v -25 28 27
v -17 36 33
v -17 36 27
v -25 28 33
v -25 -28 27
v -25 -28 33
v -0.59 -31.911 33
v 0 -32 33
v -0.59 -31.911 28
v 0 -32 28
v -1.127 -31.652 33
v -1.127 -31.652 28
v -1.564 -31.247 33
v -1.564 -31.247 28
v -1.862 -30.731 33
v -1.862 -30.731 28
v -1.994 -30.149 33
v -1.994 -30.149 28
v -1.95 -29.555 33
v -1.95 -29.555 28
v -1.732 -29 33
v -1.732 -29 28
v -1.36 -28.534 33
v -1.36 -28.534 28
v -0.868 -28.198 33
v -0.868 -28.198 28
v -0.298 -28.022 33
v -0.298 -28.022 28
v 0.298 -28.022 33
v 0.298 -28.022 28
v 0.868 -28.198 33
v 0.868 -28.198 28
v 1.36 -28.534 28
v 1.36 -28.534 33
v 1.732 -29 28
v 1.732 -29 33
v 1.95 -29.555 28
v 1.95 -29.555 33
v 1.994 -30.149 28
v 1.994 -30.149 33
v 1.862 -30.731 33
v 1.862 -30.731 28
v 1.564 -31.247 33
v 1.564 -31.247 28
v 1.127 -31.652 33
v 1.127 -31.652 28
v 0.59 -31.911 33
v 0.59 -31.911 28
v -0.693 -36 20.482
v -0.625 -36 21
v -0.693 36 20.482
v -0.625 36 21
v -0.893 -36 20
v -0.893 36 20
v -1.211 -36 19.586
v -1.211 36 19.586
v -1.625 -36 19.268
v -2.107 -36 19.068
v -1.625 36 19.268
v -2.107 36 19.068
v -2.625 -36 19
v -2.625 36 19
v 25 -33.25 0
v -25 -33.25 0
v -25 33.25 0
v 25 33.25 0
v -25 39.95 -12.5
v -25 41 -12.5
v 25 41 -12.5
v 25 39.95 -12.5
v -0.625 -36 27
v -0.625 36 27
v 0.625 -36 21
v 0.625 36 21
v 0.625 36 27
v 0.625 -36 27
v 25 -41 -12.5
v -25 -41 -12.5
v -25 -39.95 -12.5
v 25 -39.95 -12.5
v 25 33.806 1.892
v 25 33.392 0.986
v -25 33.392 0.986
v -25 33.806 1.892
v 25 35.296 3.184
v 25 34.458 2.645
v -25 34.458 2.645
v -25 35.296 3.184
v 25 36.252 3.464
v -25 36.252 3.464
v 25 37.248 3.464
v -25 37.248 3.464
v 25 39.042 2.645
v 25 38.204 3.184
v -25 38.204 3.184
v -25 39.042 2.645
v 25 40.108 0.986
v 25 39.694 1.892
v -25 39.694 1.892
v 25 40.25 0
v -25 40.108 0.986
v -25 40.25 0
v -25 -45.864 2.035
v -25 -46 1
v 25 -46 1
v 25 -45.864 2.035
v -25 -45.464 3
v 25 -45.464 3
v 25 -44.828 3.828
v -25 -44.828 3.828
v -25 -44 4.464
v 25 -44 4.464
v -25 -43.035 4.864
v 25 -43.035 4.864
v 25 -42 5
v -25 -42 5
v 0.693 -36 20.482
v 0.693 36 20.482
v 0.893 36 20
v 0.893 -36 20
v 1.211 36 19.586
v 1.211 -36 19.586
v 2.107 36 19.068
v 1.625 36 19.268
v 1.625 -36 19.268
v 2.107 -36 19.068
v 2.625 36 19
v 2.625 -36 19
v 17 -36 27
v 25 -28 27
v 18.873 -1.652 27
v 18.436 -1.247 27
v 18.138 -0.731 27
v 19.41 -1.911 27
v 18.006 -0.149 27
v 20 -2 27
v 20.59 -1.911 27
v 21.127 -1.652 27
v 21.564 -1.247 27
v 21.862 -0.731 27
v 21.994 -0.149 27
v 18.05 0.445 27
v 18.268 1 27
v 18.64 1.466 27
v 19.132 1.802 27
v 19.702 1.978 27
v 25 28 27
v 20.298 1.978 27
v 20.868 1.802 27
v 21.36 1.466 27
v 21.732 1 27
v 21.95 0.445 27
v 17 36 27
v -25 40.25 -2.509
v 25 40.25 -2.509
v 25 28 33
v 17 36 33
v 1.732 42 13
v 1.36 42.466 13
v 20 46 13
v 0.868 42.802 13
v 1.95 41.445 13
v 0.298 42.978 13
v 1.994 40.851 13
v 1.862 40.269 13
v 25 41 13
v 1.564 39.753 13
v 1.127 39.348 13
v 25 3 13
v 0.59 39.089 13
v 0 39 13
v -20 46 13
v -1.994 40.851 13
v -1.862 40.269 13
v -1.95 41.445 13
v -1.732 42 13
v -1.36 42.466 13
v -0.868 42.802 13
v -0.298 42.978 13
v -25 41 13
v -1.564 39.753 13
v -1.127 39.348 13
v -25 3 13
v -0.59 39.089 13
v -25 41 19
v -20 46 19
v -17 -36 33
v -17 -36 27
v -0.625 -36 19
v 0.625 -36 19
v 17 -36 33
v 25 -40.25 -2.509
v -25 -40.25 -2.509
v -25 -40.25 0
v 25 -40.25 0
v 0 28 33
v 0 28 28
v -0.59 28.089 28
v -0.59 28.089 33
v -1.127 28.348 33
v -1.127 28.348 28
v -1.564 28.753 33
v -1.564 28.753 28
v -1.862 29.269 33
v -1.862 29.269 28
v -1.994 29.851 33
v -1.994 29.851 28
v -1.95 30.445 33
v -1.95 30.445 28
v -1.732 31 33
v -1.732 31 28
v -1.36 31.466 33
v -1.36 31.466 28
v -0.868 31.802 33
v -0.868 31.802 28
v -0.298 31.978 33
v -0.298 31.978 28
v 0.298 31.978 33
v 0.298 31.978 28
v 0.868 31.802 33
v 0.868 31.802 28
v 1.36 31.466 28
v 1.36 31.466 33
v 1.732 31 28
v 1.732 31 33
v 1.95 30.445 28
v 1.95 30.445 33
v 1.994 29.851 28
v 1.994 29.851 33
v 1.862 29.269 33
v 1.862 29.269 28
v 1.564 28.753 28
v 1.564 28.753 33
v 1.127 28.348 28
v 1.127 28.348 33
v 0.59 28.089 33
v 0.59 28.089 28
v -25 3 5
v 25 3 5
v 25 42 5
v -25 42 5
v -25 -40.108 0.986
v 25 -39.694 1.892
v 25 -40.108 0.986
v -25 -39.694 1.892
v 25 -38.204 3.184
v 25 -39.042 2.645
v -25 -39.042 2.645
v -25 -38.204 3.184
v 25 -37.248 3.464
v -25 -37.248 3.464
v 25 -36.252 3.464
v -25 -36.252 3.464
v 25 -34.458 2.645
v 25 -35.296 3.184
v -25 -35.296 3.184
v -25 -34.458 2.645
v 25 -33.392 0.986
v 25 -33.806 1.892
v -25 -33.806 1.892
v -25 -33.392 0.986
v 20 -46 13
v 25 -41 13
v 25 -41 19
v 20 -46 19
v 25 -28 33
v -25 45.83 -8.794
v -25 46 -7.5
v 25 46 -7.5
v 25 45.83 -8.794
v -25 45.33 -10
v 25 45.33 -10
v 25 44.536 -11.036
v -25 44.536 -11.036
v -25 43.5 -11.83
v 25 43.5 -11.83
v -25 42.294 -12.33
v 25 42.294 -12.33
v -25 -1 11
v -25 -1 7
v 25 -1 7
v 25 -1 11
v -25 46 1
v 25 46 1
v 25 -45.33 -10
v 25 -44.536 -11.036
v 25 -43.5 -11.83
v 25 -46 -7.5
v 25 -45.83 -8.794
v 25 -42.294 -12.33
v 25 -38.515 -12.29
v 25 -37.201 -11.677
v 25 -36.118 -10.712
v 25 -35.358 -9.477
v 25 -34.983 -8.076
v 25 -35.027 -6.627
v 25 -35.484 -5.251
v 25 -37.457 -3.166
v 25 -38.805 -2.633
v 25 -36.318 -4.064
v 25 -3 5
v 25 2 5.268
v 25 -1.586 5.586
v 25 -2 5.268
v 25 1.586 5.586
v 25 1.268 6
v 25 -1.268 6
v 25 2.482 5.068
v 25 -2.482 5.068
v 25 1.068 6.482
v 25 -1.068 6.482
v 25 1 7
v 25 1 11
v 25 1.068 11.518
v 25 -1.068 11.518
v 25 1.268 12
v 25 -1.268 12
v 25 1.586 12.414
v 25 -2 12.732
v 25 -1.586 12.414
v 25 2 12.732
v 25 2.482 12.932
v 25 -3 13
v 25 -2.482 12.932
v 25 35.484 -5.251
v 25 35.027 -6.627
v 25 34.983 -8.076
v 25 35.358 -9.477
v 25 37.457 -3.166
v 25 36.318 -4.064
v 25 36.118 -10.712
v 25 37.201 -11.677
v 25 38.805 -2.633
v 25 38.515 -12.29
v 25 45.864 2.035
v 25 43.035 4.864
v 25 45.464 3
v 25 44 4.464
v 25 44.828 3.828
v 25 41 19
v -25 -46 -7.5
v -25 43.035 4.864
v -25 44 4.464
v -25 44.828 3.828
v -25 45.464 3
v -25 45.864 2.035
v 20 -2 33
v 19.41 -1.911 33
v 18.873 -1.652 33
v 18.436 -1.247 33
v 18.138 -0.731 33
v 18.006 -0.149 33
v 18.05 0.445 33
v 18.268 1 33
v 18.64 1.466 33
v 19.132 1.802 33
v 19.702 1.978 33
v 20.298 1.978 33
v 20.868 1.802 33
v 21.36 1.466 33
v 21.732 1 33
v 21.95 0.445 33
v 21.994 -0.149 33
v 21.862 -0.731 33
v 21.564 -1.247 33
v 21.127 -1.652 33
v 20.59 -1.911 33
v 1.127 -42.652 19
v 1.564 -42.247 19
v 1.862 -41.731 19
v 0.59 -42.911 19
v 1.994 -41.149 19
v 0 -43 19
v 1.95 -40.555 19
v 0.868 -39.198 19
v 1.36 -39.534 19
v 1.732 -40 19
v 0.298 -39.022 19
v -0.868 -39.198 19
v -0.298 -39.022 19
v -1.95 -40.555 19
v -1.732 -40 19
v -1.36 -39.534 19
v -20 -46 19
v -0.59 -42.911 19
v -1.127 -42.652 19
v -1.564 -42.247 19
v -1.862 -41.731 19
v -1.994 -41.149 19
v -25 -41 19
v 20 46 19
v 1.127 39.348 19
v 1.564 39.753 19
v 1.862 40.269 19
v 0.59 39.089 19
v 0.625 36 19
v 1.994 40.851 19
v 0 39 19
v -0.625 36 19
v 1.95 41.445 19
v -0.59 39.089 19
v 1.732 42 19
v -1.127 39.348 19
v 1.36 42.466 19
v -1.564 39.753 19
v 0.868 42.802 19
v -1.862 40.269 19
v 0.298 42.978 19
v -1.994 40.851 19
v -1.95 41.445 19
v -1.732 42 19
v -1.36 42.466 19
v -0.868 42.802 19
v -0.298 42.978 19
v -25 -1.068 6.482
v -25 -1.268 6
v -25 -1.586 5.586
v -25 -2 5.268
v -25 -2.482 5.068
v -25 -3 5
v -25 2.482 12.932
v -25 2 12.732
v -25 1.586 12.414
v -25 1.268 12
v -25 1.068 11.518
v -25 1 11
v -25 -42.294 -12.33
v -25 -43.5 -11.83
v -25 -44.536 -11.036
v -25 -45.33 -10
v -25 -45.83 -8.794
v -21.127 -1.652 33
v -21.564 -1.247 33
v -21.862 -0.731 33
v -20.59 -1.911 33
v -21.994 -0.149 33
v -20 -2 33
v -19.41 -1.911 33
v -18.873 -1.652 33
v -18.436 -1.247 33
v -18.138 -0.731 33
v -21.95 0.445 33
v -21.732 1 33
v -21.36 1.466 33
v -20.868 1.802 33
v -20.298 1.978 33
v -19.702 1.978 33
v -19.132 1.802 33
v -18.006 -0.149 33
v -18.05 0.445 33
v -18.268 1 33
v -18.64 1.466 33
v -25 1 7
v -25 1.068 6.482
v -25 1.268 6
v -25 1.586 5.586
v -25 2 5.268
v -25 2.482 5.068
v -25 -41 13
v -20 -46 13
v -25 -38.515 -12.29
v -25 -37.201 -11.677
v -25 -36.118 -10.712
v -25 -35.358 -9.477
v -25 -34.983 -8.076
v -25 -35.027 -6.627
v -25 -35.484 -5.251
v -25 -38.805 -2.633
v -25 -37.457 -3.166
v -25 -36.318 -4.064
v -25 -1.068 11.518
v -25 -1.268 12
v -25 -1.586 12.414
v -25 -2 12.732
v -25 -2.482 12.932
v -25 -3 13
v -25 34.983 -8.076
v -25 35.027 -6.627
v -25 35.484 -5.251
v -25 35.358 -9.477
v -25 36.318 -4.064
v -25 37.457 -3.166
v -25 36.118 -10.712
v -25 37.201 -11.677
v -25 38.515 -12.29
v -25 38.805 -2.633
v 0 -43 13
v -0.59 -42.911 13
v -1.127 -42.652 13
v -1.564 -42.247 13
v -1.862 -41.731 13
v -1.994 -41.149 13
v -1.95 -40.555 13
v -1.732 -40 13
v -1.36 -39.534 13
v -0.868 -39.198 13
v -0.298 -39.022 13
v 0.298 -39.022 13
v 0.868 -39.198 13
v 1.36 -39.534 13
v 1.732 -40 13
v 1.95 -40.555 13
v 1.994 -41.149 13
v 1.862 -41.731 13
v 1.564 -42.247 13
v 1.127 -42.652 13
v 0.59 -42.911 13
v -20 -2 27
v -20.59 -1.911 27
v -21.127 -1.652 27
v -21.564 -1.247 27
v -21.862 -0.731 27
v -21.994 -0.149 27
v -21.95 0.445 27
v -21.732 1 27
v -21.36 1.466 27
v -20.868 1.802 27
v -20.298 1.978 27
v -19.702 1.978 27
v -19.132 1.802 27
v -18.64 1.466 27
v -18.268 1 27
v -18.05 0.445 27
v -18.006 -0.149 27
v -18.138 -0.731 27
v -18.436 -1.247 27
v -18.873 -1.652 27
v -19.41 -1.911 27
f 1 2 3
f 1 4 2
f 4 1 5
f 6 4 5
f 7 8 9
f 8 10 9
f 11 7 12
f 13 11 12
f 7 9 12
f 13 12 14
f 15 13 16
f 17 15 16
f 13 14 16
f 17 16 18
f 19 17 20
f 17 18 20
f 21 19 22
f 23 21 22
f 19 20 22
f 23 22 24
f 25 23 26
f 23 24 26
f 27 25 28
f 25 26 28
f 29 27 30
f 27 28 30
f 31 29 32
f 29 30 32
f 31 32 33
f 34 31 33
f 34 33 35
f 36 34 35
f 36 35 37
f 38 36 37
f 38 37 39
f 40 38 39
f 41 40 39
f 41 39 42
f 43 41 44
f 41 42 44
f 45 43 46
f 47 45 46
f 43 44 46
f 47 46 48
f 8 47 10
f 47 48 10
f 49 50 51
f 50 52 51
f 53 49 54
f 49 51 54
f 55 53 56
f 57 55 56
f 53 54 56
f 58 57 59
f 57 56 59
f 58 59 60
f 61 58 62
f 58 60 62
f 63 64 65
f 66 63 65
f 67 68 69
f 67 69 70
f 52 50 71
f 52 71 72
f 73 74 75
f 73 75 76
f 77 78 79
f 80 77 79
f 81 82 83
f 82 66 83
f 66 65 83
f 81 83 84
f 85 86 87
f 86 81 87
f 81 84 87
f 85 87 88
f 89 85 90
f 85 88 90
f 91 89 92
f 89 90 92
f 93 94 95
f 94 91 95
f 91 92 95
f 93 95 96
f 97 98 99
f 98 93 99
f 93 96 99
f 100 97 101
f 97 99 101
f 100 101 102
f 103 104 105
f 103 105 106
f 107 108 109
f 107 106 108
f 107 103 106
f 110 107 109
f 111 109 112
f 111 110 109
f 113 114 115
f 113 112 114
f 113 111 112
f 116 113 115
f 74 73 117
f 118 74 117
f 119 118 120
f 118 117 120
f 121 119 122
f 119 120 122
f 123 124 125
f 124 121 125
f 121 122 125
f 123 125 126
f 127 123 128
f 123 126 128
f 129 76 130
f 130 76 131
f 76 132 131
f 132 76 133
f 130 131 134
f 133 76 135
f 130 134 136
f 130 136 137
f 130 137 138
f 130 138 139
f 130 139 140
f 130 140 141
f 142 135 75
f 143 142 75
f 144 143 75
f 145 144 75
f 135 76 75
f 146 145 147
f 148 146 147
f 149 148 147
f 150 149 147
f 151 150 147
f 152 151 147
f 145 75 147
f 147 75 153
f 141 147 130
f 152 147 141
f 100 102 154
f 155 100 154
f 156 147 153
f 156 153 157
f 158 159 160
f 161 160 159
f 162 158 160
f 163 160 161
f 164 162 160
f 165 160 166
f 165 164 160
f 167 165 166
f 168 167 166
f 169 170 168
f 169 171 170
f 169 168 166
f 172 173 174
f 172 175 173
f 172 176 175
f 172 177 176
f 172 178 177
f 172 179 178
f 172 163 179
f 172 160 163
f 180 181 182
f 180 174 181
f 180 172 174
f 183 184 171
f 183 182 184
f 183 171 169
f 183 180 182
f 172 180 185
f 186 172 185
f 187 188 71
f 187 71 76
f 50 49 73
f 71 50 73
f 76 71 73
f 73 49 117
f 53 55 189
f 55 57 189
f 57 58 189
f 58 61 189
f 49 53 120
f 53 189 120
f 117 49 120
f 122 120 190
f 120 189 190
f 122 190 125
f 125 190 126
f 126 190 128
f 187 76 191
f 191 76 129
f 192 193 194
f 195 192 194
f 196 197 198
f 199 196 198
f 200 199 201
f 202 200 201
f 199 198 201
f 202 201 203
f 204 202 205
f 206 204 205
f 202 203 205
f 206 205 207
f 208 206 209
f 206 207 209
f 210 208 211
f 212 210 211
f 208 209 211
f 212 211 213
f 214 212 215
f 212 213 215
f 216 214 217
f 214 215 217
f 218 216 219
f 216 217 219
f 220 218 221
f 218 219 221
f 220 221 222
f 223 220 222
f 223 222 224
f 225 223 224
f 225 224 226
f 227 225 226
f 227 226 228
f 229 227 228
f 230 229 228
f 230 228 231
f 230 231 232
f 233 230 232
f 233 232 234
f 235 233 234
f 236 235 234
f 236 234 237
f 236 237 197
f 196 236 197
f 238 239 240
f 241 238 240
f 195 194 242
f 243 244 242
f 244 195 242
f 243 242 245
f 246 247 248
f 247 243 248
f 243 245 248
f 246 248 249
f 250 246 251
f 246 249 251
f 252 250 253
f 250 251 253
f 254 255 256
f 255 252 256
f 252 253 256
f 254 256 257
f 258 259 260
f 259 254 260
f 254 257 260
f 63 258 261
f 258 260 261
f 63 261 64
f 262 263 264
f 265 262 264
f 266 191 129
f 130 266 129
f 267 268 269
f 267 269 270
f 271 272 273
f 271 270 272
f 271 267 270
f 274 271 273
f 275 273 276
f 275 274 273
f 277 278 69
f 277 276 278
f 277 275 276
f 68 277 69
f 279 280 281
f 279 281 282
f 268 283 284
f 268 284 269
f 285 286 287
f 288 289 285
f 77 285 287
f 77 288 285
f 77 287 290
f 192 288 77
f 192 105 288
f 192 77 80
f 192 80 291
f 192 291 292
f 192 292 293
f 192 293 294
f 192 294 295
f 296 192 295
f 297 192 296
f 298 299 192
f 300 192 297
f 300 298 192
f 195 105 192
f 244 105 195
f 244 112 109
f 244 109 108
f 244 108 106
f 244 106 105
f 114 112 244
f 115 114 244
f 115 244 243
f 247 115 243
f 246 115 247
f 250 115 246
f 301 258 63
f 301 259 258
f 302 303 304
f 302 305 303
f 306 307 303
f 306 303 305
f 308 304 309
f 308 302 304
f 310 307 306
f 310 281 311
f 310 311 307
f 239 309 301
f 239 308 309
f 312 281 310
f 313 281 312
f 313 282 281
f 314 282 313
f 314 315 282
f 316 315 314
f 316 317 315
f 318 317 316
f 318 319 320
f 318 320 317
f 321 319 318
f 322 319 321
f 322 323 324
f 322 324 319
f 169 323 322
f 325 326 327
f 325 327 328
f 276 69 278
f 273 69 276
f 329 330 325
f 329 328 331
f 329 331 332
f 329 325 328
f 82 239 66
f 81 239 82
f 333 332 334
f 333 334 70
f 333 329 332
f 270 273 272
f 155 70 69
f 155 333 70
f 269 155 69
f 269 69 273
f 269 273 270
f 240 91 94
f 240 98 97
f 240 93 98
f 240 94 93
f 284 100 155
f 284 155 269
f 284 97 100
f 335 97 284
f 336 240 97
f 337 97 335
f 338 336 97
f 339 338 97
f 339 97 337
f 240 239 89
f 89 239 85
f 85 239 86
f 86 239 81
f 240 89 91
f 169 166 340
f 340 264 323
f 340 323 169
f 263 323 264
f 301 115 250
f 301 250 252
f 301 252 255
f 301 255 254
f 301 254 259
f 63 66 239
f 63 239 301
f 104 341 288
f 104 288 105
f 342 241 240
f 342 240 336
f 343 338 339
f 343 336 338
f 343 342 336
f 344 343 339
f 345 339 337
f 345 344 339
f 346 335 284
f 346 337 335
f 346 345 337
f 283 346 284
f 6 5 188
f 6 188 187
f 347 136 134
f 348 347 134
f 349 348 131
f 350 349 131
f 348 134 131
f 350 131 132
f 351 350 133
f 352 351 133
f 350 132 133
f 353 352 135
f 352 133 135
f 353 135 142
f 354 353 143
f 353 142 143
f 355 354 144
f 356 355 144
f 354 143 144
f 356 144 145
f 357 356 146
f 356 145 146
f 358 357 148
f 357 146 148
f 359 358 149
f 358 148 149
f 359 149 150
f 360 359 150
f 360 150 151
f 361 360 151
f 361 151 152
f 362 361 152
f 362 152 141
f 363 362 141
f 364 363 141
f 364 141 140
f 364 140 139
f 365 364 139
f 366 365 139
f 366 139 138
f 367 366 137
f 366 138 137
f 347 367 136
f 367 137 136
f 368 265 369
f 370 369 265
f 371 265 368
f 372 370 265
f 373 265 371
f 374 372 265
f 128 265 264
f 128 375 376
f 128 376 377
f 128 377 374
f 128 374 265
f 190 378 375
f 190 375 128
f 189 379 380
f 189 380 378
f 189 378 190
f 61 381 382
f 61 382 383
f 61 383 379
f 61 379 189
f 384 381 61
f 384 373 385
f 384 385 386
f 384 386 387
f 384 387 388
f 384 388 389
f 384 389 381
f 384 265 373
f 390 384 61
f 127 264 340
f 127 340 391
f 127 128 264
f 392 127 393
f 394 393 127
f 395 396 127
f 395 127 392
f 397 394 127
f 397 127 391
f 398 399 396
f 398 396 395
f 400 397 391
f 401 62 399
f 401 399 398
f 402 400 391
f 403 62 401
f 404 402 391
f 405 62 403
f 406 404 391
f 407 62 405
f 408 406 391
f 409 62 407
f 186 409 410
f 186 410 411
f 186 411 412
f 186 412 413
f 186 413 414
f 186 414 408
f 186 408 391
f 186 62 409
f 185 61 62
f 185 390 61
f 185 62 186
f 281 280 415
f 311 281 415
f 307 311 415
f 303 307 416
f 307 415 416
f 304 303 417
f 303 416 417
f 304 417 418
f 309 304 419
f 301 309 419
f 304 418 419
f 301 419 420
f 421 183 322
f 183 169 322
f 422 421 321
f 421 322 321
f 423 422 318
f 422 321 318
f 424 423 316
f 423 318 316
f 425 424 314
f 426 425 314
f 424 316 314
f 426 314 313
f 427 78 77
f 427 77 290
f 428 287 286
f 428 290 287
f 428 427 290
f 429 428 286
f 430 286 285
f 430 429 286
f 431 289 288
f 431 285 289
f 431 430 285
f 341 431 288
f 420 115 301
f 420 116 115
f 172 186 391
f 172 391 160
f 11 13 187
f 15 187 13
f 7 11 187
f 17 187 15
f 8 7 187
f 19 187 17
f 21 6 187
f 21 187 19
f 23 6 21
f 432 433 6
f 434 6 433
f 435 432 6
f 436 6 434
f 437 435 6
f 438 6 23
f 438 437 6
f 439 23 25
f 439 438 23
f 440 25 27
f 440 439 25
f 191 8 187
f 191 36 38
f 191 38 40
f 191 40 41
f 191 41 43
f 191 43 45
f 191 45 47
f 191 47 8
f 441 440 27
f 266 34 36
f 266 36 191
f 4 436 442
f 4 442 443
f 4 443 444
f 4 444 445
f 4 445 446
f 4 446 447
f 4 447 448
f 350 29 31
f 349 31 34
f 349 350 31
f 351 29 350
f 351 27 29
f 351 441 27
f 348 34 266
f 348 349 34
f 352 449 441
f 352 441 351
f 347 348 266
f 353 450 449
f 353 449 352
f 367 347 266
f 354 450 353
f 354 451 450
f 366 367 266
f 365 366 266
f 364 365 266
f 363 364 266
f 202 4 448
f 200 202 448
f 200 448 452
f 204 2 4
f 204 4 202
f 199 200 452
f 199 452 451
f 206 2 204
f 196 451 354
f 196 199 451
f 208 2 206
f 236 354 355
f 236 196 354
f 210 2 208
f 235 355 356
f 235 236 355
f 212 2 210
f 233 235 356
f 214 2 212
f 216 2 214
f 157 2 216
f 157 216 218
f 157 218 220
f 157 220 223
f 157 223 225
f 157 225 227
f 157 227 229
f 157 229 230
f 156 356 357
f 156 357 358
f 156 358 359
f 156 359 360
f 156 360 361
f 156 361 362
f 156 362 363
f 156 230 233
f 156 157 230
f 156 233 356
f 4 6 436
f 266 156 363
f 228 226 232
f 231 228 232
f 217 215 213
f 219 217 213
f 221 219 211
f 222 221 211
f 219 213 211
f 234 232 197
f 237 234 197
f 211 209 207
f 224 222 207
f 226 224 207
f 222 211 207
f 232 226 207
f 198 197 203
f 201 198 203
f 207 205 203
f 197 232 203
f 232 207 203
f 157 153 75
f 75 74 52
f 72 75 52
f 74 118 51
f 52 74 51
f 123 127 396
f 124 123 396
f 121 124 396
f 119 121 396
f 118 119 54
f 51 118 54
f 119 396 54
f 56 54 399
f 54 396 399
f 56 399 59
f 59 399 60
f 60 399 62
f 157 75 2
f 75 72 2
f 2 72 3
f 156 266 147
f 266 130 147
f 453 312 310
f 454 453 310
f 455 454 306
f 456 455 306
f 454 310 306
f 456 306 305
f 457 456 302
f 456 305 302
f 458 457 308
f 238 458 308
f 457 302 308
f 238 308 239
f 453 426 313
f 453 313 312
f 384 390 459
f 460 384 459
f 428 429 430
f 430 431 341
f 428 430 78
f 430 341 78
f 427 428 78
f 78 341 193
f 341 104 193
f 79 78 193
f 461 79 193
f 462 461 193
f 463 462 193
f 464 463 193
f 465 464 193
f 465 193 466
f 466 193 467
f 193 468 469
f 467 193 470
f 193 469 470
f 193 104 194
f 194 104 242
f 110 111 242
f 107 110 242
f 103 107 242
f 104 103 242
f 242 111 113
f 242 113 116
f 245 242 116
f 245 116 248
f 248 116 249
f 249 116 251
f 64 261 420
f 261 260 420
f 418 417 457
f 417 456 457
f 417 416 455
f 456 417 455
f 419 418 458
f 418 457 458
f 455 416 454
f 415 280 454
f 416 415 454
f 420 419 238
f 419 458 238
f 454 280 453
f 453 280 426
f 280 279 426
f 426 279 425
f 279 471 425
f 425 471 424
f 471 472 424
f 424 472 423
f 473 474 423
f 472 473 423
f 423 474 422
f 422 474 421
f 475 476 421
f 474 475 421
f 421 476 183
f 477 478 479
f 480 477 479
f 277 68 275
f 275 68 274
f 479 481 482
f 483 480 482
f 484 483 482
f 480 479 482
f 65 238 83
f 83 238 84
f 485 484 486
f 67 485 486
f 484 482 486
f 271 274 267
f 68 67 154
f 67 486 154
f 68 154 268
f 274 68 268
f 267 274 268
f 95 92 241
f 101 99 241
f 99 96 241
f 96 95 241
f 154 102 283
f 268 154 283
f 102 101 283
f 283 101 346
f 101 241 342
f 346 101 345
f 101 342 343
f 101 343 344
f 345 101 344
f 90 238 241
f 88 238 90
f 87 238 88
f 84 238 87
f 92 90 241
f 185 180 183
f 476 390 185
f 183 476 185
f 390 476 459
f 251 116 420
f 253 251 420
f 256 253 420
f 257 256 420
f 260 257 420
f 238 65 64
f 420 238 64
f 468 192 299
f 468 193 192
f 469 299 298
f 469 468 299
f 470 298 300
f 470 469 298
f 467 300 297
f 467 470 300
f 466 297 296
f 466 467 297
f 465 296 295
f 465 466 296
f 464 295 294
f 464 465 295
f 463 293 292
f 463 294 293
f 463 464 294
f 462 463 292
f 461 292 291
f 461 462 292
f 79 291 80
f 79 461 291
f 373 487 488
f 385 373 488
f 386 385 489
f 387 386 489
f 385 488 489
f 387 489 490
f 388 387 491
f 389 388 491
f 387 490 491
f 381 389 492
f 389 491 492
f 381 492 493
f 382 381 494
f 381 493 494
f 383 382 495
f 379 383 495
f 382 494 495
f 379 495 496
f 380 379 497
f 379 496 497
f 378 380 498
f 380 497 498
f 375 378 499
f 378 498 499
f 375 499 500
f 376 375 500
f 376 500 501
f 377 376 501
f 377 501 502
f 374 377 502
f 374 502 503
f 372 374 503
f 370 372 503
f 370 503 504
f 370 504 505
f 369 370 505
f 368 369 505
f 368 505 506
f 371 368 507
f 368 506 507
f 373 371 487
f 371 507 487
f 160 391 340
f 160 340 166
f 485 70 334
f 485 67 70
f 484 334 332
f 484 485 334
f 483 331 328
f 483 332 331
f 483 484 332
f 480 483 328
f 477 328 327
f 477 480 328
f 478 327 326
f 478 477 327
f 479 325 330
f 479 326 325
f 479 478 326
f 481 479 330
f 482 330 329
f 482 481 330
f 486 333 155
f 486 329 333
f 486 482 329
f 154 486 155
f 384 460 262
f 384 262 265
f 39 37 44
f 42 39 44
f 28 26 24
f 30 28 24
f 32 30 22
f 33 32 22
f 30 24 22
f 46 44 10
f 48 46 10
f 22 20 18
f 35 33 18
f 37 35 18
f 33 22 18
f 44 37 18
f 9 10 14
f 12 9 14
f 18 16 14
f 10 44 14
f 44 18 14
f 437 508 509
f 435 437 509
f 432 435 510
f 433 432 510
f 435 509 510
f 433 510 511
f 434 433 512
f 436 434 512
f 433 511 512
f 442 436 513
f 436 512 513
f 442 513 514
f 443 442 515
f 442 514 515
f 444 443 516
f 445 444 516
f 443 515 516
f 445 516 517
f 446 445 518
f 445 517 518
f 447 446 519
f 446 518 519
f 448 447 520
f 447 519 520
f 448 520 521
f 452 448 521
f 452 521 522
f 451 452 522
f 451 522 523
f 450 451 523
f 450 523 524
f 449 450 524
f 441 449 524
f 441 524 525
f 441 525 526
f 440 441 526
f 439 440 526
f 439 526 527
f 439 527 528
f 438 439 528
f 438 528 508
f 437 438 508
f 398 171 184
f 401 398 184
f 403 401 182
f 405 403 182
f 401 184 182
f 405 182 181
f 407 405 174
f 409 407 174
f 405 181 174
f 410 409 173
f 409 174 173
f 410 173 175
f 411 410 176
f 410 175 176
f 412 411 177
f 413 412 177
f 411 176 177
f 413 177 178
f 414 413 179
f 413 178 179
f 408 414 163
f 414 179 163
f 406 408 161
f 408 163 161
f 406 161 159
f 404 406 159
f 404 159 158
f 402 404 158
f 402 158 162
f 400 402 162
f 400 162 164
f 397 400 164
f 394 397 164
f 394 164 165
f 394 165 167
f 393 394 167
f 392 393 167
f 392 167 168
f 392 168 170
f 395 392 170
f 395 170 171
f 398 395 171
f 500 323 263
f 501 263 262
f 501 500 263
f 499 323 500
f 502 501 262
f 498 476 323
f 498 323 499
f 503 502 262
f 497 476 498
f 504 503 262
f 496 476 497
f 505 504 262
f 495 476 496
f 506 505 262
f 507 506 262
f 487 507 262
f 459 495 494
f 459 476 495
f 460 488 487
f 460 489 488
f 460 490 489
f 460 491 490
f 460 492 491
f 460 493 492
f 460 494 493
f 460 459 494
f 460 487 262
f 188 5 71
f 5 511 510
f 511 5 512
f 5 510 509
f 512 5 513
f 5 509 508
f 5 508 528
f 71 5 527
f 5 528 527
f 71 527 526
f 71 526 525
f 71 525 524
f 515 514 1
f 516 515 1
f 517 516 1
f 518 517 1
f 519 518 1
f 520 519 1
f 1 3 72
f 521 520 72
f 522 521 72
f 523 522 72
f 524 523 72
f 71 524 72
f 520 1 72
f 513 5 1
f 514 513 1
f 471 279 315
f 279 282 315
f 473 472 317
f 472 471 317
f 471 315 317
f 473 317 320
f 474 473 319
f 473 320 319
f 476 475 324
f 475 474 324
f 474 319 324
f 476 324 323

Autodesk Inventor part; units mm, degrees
ref_plane "YZ Plane" through (0, 0, 0) normal (1, 0, 0) x (0, 1, 0)
ref_plane "XZ Plane" through (0, 0, 0) normal (0, 1, 0) x (-1, 0, 0)
ref_plane "XY Plane" through (0, 0, 0) normal (0, 0, 1) x (1, 0, 0)
sketch "Sketch1" plane through (0, 0, 0) normal (1, 0, 0) x (0, 1, 0)
  line L0 (-46, -7.5) -> (-46, 1)
  line L1 (-42, 5) -> (42, 5)
  line L2 (46, 1) -> (46, -7.5)
  line L3 (-41, -12.5) -> (-39.95, -12.5)
  line L4 (-40.25, -2.509) -> (-40.25, 0)
  line L5 (-40.25, 0) -> (40.25, 0)
  line L6 (-1, 5) -> (-1, 13)
  line L7 (-1, 13) -> (1, 13)
  line L8 (1, 13) -> (1, 5)
  line L9 (-46, 19) -> (46, 19)
  line L10 (46, 19) -> (46, 13)
  line L11 (46, 13) -> (-46, 13)
  line L12 (-46, 13) -> (-46, 19)
  arc A0 (46, 1) -> (42, 5) centre (42, 1) ccw
  arc A1 (-42, 5) -> (-46, 1) centre (-42, 1) ccw
  arc A2 (40.25, 0) -> (33.25, 0) centre (36.75, 0) ccw
  arc A3 (-33.25, 0) -> (-40.25, 0) centre (-36.75, 0) ccw
  line L13 (40.25, 0) -> (40.25, -2.509)
  arc A4 (-39.95, -12.5) -> (-40.25, -2.509) centre (-39.95, -7.5) ccw
  arc A5 (-46, -7.5) -> (-41, -12.5) centre (-41, -7.5) ccw
  circle A6 centre (39.95, -7.5) radius 5
  line L14 (41, -12.5) -> (39.95, -12.5)
  arc A7 (41, -12.5) -> (46, -7.5) centre (41, -7.5) ccw
  point P0 (0, 0)
  point P1 (-46, -12.5)
  point P2 (-46, 5)
  point P3 (46, 5)
  point P4 (46, -12.5)
  point P5 (0, 5)
  point P6 (0, 0)
  point P7 (0, 13)
  point P8 (1, 13)
  point P9 (-1, 13)
  point P10 (-40.25, -1.2545)
  point P11 (40.25, -1.2545)
  point P12 (40.25, -2.509)
  dimension "d71" = 10
  dimension "d2" = 80.5
  dimension "d10" = 92
  dimension "d11" = 5
  dimension "d13" = 2
  dimension "d14" = 8
  dimension "d15" = 6
  dimension "d52" = 4
  dimension "d53" = 7
  dimension "d54" = 7
  dimension "d67" = 10
  dimension "d68" = 7.5
  dimension "d69" = 0.3
  dimension "d70" = 5
  dimension "d72" = 0.3
  dimension "d73" = 5
extrude "Extrusion1" add sketch "Sketch1" along normal mid plane 50 contours L0 A1 L1 A0 L2 A7 L14 A6 L13 A2 L5 A3 L4 A4 L3 A5 | L6 L7 L8 L1 | L11 L12 L9 L10 L7 | A6
sketch "Sketch2" plane through (-25, -46, 19) normal (0, 0, 1) x (1, 0, 0)
  line L0 (0, 0) -> (50, 0) projected
  line L1 (50, 92) -> (50, 0) projected
  line L2 (0, 92) -> (50, 92) projected
  line L3 (0, 0) -> (0, 92) projected
  line L4 (25.625, 10) -> (24.375, 10)
  line L5 (24.375, 10) -> (24.375, 82)
  line L6 (24.375, 82) -> (25.625, 82)
  line L7 (25.625, 82) -> (25.625, 10)
  line L8 (25.625, 10) -> (24.375, 82) construction
  line L9 (24.375, 10) -> (25.625, 82) construction
  point P0 (25, 46)
  point P1 (20.75, 0)
  point P2 (20.75, 50)
  point P3 (19.25, 50)
  point P4 (19.25, 0)
  point P5 (25, 10)
  dimension "d16" = 1.25
  dimension "d19" = 10
extrude "Extrusion2" add sketch "Sketch2" along normal blind 8 contours L4 L5 L6 L7
sketch "Sketch3" plane through (-25, -46, 19) normal (0, 0, 1) x (1, 0, 0)
  line L0 (25.625, 82) -> (25.625, 10) projected
  line L1 (25.625, 10) -> (24.375, 10) projected
  line L2 (24.375, 10) -> (24.375, 82) projected
  line L3 (24.375, 82) -> (25.625, 82) projected
  line L4 (0, 0) -> (50, 0) projected
  line L5 (50, 92) -> (50, 0) projected
  line L6 (0, 92) -> (50, 92) projected
  line L7 (0, 0) -> (0, 92) projected
  line L8 (25.625, 10) -> (24.375, 10) projected
  line L9 (25, 10) -> (25, 0)
  line L10 (24.375, 82) -> (25.625, 82) projected
  line L11 (25, 82) -> (25, 92)
  point P0 (25, 46)
  point P1 (25, 5)
  point P2 (25, 87)
hole "Hole1" at (0, -41, 19) at (0, 41, 19) direction (0, 0, -1) diameter 4 depth 8 tip angle 118
sketch "Sketch4" plane through (-25, -46, 27) normal (0, 0, 1) x (1, 0, 0)
  line L0 (0, 10) -> (50, 10)
  line L1 (50, 10) -> (50, 82)
  line L2 (50, 82) -> (0, 82)
  line L3 (0, 82) -> (0, 10)
  line L4 (0, 10) -> (50, 82) construction
  line L5 (50, 10) -> (0, 82) construction
  line L6 (25.625, 82) -> (24.375, 82) projected
  line L7 (0, 0) -> (0, 92) projected
  point P0 (25, 46)
  point P1 (25, 82)
  point P2 (0, 46)
extrude "Extrusion3" add sketch "Sketch4" along normal blind 6
sketch "Sketch5" plane through (-25, -46, 33) normal (0, 0, 1) x (1, 0, 0)
  line L0 (50, 82) -> (0, 82) projected
  line L1 (0, 82) -> (0, 10) projected
  line L2 (0, 10) -> (50, 10) projected
  line L3 (50, 10) -> (50, 82) projected
  line L4 (5, 46) -> (45, 46)
  point P0 (25, 46)
  point P1 (25, 46)
  dimension "d29" = 5
hole "Hole2" at (-20, 0, 33) at (20, 0, 33) direction (0, 0, -1) diameter 4 depth 8 tip angle 118
sketch "Sketch6" plane through (-25, -46, 33) normal (0, 0, 1) x (1, 0, 0)
  circle A0 centre (5, 46) radius 2 projected
  circle A1 centre (45, 46) radius 2 projected
  line L0 (50, 82) -> (0, 82) projected
  line L1 (0, 82) -> (0, 10) projected
  line L2 (0, 10) -> (50, 10) projected
  line L3 (50, 10) -> (50, 82) projected
  line L4 (25, 16) -> (25, 76)
  point P0 (25, 46)
  point P1 (25, 46)
  point P2 (25, 46)
  dimension "d38" = 60
hole "Hole3" at (0, -30, 33) at (0, 30, 33) direction (0, 0, -1) diameter 4 depth 5
chamfer "Chamfer1" distance 5 angle 45 4 edges at (-25, -46, 16) (-25, 46, 16) (25, -46, 16) (25, 46, 16)
chamfer "Chamfer2" distance 8 angle 45 4 edges at (25, 36, 30) (25, -36, 30) (-25, -36, 30) (-25, 36, 30)
fillet "Fillet1" radius 2 6 edges at (0.625, 0, 19) (-0.625, 0, 19) (0, -1, 5) (0, 1, 5) (0, -1, 13) (0, 1, 13)
equation "\"d72\" = d69"
properties part number "Rail-FlextureBaseLarge" material "ABS Plastic"
